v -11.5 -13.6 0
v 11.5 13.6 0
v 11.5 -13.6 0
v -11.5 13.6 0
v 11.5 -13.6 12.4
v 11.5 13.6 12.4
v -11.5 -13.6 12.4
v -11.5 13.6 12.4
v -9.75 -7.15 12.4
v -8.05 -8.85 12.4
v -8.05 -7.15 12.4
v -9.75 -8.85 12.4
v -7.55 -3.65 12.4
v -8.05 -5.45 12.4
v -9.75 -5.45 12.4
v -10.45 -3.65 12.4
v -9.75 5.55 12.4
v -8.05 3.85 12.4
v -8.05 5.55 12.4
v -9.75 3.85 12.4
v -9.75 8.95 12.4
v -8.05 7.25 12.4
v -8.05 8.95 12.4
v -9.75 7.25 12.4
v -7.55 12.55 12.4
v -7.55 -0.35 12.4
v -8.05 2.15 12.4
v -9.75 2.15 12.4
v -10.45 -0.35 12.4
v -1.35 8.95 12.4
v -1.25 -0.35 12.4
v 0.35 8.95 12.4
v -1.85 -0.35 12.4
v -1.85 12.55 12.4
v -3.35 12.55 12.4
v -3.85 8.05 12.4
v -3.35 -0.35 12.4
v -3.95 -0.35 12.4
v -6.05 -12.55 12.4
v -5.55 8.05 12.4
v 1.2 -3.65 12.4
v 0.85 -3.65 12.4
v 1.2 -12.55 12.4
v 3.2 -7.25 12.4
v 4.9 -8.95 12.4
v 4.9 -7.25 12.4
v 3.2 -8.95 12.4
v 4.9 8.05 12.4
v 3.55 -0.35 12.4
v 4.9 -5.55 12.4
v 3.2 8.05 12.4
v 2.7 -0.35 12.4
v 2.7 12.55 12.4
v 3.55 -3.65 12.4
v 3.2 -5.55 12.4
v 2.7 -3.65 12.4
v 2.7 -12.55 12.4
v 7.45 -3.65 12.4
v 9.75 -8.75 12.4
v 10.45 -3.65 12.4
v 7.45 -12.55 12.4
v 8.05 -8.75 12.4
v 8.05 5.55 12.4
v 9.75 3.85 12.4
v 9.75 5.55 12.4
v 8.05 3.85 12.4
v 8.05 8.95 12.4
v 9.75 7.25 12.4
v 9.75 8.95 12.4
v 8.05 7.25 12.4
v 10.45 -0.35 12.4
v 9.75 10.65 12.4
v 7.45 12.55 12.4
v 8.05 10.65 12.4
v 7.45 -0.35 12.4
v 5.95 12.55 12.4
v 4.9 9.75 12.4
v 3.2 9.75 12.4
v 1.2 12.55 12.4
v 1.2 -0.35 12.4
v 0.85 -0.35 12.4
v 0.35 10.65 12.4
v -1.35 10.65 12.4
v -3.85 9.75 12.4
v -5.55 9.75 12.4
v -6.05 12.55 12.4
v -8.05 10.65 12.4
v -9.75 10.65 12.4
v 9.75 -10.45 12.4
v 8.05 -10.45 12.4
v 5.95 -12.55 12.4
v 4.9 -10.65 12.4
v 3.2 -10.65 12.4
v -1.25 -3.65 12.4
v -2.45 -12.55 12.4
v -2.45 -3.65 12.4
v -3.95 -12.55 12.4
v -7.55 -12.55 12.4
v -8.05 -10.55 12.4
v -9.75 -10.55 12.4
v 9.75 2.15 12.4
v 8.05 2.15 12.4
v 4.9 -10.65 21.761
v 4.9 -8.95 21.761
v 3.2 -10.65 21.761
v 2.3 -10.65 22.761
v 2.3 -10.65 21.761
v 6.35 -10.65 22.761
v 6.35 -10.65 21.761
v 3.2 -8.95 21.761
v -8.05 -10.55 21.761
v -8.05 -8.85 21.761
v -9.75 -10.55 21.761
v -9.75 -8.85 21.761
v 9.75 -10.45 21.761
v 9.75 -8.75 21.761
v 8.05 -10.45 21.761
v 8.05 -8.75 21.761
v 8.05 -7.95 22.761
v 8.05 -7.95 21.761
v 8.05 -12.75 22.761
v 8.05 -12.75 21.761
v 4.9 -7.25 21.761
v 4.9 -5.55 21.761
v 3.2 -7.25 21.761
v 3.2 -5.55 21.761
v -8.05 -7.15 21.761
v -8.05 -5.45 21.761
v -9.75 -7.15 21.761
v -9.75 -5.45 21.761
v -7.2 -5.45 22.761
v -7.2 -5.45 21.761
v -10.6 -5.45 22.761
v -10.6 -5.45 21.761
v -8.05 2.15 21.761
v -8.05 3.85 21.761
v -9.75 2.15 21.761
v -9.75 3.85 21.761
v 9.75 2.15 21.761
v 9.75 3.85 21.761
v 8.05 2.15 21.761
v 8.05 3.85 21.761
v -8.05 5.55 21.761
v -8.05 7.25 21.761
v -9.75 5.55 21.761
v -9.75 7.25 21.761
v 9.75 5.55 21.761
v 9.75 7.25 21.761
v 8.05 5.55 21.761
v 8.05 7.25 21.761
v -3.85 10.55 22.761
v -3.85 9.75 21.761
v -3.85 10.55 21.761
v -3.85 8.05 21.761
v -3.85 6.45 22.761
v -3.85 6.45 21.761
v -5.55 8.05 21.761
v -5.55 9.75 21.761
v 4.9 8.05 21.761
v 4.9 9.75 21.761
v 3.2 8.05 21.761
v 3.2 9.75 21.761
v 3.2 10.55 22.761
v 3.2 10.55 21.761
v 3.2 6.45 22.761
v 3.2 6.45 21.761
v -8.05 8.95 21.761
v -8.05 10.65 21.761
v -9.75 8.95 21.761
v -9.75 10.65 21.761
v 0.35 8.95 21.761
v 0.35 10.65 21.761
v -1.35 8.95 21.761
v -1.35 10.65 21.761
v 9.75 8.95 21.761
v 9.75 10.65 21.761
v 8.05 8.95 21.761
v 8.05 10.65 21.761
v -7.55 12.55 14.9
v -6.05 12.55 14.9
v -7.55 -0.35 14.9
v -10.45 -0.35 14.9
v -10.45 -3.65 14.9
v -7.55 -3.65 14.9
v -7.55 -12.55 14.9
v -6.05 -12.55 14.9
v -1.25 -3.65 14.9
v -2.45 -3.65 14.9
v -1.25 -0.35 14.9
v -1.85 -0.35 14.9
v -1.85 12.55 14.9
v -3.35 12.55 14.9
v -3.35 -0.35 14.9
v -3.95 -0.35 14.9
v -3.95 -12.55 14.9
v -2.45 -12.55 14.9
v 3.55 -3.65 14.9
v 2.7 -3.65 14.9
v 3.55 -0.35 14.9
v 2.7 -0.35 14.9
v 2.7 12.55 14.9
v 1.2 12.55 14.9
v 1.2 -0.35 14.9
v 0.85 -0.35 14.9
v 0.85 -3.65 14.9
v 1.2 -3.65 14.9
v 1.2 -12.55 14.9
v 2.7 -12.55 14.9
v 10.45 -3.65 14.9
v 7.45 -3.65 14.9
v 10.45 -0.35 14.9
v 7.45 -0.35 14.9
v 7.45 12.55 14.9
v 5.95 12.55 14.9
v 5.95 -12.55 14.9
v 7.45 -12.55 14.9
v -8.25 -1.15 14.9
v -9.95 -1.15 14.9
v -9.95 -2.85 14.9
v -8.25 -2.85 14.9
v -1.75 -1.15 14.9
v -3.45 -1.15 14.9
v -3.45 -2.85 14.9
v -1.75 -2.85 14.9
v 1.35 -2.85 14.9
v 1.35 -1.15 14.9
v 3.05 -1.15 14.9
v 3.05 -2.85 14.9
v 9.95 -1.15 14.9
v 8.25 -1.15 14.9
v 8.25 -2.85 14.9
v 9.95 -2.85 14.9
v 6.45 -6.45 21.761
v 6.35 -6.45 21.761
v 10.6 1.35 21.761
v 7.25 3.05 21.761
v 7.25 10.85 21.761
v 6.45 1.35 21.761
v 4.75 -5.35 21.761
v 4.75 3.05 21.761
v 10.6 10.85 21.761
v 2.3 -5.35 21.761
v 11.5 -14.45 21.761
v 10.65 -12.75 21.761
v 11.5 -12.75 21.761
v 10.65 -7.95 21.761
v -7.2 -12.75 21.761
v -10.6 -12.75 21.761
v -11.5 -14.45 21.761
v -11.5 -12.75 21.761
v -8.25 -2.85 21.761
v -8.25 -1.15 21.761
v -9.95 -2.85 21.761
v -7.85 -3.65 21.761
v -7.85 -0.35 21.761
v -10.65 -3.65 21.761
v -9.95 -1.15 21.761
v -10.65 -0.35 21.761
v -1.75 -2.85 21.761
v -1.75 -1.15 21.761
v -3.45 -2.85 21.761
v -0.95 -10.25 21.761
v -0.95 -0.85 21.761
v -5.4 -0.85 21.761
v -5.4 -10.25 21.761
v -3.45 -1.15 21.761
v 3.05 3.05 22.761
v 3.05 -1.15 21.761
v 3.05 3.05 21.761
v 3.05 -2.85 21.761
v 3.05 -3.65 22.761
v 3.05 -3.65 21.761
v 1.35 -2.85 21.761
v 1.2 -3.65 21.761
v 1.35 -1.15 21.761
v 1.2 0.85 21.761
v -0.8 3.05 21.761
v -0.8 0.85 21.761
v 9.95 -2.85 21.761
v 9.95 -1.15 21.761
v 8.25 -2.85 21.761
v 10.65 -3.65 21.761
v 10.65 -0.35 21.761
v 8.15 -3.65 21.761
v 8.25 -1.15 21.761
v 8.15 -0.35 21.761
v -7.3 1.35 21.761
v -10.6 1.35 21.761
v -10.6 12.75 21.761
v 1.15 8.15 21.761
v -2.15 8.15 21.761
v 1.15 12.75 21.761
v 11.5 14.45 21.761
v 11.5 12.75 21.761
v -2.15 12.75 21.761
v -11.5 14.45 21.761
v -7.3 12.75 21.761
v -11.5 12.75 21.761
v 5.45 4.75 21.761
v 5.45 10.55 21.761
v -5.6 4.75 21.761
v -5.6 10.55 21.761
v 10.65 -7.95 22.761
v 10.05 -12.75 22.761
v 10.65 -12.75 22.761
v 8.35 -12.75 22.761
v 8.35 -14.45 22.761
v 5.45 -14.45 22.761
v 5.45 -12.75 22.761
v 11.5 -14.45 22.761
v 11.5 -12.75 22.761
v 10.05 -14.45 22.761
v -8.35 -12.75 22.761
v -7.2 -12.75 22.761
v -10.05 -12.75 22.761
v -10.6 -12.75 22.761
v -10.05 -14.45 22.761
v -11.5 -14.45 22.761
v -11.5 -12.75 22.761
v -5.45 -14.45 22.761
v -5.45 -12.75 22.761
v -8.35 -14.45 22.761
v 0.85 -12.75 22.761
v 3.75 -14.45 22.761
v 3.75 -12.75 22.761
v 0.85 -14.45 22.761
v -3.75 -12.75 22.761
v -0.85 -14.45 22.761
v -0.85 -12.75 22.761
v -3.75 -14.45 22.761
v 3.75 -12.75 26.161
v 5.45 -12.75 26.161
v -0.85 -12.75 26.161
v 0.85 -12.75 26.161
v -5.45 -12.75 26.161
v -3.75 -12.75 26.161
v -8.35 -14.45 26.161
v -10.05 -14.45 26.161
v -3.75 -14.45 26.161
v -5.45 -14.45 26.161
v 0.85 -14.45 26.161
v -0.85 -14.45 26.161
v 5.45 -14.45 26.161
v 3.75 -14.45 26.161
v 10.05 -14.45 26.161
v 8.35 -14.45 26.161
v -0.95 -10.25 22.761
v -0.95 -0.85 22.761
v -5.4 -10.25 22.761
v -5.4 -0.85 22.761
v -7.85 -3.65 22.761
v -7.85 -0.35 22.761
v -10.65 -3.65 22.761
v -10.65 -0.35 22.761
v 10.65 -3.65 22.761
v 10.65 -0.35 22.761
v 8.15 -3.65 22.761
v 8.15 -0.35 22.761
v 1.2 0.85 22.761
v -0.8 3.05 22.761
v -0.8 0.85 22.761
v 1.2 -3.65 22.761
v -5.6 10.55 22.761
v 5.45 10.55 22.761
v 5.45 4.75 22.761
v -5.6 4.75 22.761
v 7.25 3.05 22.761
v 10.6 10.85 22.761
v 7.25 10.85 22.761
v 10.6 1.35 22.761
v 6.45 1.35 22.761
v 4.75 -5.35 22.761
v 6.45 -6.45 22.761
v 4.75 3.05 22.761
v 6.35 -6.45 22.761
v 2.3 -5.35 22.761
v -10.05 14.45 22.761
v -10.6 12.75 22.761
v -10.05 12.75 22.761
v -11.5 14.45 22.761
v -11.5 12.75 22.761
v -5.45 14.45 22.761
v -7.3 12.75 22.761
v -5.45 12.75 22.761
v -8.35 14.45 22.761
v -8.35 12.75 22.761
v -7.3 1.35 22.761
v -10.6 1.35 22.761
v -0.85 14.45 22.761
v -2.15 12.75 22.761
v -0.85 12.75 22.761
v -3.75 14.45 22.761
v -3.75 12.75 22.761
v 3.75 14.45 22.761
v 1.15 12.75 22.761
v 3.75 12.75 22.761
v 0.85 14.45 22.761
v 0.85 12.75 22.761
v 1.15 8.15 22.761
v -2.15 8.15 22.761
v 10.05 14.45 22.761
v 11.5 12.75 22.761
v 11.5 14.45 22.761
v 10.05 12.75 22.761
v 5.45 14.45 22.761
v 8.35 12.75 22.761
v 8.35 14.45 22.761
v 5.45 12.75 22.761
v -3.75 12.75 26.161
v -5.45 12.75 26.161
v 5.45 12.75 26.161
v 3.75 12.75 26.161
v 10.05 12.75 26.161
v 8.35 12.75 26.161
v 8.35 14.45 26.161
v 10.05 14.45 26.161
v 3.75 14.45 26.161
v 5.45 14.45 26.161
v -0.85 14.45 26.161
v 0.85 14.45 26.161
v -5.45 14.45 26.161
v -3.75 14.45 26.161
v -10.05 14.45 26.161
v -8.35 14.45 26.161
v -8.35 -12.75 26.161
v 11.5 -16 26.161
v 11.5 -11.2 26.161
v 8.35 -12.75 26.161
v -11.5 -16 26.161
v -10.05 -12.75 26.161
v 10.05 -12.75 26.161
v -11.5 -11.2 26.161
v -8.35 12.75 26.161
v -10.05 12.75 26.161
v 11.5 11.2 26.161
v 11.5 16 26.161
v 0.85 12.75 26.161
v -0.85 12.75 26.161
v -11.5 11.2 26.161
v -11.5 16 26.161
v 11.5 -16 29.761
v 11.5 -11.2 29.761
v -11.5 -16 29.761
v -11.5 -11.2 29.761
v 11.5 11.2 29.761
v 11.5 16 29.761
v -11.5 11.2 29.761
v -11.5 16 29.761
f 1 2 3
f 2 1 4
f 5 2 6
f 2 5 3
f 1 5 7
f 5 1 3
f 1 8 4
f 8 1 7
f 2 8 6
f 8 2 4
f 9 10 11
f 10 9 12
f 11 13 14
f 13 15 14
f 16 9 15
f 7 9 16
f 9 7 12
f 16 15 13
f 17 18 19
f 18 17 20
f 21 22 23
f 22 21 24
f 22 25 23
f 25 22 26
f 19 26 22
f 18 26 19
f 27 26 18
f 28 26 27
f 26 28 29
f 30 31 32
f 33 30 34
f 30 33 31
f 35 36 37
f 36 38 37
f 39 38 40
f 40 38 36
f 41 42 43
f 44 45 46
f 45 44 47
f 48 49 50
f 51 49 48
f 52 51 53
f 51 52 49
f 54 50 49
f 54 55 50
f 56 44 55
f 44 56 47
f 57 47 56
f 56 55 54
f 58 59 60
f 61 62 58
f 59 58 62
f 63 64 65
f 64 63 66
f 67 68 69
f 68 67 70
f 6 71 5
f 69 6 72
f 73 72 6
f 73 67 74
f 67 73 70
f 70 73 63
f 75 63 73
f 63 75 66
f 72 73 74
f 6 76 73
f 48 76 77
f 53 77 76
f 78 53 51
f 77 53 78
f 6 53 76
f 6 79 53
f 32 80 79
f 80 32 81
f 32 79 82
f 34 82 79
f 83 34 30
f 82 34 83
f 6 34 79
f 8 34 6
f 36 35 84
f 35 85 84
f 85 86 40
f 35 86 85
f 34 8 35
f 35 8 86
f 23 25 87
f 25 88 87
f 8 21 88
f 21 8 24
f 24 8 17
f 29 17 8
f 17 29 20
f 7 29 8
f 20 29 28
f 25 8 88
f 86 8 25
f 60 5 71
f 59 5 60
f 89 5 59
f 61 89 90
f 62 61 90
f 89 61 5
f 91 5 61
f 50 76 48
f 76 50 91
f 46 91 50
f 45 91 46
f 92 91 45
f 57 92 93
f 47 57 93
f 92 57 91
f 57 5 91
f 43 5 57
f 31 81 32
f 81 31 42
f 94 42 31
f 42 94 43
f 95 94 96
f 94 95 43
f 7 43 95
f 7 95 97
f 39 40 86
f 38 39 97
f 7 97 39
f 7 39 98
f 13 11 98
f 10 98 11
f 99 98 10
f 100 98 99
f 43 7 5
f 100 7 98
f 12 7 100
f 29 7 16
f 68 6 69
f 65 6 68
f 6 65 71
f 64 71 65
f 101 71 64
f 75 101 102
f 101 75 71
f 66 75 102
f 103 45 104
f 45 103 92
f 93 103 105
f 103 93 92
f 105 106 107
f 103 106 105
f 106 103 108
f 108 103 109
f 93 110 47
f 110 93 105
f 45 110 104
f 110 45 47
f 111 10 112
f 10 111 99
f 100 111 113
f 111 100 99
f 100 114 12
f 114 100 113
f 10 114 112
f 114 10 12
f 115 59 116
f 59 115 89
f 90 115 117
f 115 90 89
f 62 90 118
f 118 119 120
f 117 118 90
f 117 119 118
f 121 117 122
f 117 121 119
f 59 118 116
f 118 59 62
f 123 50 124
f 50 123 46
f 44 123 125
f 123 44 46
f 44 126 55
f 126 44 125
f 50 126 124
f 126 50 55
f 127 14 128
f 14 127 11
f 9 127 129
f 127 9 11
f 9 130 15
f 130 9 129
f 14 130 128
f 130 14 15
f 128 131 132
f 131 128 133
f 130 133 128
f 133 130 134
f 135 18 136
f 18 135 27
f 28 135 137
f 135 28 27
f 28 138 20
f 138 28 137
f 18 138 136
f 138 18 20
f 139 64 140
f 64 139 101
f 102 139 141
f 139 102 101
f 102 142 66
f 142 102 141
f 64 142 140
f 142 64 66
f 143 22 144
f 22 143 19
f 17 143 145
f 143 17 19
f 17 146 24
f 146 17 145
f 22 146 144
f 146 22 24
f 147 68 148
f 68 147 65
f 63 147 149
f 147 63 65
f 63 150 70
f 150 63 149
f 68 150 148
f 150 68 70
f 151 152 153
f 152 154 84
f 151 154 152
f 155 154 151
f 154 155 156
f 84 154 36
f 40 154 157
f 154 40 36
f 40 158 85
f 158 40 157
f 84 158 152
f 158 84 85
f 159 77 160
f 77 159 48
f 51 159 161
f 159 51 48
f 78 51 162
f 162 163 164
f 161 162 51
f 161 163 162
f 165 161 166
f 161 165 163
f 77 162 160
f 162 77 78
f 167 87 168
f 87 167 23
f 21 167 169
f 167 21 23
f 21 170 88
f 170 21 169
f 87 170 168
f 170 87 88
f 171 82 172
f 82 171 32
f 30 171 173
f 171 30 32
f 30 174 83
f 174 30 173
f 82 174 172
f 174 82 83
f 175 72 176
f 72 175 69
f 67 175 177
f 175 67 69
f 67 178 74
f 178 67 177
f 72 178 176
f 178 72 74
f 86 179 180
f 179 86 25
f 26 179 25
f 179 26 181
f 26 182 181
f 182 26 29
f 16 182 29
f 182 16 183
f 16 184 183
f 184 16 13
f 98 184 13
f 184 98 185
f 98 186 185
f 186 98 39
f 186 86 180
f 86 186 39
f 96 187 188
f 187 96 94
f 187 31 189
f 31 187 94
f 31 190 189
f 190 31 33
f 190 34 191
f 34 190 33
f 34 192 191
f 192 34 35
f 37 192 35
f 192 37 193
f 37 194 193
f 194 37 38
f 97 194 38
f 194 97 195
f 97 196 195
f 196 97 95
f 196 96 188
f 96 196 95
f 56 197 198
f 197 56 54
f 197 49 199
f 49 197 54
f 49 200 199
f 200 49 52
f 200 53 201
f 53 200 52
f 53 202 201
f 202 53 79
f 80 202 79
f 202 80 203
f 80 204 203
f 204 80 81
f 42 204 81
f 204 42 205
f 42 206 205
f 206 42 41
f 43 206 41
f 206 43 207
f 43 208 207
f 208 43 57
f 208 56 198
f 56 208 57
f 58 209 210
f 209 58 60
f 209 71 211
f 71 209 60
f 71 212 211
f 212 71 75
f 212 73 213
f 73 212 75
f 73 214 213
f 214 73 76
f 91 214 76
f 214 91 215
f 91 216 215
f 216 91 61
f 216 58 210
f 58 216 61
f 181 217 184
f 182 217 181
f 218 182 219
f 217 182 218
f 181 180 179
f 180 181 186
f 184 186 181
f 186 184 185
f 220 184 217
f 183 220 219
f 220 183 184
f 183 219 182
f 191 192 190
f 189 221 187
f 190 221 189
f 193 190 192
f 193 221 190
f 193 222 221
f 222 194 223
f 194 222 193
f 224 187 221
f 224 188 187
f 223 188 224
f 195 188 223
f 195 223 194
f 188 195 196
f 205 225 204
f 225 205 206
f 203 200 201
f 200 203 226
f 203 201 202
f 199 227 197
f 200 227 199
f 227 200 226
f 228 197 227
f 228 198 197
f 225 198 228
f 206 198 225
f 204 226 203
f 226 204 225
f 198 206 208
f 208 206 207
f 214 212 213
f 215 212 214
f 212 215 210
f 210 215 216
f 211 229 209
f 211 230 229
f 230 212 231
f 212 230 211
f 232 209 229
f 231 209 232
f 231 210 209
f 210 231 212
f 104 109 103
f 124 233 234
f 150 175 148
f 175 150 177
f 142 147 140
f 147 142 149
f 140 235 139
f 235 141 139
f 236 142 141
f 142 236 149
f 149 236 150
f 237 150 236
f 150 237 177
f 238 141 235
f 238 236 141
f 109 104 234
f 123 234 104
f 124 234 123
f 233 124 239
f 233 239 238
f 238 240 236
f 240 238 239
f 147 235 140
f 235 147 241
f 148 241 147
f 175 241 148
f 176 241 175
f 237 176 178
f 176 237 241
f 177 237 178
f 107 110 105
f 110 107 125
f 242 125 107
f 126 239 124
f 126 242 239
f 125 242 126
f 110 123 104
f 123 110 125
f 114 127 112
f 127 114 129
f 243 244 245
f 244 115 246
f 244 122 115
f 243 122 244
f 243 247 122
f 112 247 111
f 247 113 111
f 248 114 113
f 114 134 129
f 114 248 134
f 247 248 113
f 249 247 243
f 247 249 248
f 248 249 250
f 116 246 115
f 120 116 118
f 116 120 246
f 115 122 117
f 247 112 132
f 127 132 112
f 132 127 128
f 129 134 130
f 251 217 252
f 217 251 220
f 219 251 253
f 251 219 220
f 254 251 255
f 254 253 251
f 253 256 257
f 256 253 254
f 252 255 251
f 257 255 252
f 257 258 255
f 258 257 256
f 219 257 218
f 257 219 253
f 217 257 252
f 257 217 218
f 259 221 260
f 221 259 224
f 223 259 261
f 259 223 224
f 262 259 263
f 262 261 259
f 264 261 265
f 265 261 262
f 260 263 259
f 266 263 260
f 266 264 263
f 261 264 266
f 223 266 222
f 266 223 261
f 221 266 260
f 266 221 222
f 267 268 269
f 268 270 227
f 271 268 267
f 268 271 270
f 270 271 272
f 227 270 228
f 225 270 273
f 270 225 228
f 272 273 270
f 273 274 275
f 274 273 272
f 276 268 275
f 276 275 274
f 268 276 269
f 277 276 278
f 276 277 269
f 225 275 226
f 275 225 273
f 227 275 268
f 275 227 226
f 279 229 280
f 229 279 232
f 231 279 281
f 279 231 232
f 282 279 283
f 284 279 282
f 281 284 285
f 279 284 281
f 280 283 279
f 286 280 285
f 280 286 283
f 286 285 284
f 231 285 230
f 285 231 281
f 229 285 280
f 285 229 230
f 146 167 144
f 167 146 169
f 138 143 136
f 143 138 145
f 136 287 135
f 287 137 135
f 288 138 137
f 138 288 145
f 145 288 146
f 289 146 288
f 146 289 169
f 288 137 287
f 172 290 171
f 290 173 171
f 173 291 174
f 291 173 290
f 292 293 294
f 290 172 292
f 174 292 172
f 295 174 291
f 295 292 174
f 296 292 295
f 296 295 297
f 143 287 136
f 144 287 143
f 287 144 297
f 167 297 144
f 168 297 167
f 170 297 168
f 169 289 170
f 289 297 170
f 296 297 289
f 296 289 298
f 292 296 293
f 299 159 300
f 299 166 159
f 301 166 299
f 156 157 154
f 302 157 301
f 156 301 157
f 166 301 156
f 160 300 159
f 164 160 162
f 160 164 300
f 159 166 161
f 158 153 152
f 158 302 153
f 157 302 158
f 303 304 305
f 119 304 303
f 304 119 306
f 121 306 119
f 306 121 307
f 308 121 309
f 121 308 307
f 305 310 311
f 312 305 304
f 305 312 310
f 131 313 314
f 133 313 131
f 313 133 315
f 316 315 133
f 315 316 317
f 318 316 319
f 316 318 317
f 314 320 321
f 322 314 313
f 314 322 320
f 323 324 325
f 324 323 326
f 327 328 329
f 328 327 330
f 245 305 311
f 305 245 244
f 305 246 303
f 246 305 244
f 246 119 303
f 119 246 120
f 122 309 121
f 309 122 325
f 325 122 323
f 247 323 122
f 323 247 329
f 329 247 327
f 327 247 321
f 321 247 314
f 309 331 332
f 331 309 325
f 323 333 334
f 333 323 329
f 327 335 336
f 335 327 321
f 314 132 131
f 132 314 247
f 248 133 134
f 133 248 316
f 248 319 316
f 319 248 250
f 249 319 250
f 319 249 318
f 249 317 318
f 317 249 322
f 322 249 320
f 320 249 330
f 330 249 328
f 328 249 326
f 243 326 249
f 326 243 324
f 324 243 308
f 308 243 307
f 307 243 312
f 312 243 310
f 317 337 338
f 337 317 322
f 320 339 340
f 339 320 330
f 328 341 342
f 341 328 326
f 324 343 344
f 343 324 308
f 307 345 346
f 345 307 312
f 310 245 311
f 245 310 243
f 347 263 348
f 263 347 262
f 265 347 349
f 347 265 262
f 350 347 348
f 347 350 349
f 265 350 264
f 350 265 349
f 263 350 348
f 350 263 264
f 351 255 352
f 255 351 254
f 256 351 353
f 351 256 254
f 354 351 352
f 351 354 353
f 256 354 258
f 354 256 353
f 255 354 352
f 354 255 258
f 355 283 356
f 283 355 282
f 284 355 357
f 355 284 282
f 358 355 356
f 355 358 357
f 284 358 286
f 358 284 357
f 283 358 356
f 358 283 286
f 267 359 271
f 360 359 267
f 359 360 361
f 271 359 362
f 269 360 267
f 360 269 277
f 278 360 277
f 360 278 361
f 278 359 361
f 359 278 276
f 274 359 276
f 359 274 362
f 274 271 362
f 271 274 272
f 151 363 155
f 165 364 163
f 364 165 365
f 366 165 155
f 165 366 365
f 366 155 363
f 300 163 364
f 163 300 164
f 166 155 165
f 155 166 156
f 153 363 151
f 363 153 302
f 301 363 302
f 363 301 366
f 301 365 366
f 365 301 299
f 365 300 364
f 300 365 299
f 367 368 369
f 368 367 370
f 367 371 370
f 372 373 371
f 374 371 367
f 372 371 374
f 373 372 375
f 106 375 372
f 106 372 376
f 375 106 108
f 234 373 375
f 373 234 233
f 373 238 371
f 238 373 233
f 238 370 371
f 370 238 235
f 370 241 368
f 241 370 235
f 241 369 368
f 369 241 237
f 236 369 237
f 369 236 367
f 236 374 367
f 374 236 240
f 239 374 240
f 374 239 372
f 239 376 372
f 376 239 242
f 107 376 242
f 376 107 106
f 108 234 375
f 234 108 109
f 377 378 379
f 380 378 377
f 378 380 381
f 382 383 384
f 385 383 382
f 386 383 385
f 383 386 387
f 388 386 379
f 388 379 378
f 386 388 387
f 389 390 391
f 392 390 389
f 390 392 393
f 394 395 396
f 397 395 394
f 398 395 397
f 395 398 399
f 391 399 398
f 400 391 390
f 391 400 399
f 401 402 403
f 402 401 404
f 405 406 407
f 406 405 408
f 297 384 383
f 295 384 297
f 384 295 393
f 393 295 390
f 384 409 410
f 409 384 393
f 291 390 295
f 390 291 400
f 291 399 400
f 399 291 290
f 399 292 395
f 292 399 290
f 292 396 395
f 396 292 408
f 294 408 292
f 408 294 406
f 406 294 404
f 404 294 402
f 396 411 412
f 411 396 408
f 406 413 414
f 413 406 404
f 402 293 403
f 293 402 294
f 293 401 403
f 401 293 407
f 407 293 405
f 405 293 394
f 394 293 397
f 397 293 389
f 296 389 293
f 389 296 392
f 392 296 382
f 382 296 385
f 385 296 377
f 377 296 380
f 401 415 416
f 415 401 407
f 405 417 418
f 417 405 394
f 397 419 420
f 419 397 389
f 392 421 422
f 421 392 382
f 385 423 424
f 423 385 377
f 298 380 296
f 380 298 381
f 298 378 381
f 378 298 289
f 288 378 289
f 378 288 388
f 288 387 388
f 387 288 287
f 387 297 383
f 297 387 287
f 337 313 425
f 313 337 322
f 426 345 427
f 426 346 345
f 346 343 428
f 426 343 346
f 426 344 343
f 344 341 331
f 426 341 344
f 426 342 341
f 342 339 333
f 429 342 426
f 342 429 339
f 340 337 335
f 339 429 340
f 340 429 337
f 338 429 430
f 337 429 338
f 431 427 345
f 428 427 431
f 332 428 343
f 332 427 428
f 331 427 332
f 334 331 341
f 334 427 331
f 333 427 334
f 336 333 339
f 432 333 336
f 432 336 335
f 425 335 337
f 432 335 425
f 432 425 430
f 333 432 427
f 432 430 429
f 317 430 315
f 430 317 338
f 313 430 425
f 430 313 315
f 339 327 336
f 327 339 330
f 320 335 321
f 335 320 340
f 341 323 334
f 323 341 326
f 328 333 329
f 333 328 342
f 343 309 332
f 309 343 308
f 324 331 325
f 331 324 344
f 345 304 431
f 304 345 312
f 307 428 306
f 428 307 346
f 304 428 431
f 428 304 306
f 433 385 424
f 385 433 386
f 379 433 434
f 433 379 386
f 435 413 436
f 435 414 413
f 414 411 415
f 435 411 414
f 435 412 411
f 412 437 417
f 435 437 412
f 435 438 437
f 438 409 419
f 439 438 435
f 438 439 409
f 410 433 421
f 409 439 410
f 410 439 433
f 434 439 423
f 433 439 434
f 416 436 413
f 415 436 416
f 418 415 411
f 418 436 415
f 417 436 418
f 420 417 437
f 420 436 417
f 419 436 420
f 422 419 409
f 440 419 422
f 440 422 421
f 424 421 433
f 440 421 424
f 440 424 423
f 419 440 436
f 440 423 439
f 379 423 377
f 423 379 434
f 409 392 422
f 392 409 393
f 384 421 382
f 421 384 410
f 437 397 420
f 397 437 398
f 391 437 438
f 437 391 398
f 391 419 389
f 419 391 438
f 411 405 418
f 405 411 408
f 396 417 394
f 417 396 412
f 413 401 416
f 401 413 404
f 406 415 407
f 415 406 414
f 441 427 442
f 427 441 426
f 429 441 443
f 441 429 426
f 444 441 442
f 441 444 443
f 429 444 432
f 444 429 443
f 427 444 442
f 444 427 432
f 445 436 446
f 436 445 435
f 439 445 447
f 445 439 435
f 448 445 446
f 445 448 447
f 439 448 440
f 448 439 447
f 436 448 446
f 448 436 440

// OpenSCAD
// Generated by SolidPython 0.4.2 on 2020-09-29 23:19:56
//!OpenSCAD

scale(v = 0.0100000000) {
	translate(v = [-1150, -1360, 0]) {
		union() {
			color(c = [0.4000000000, 0.4000000000, 0.4000000000]) {
				translate(v = [0, 0, 0]) {
					linear_extrude(height = 1000.0000000000) {
						polygon(paths = [[0, 1, 2, 3]], points = [[0, 0], [0, 2720], [2300, 2720], [2300, 0]]);
					}
				}
			}
			color(c = [0.2000000000, 0.6000000000, 0.2000000000]) {
				translate(v = [0, 0, 1000.0000000000]) {
					linear_extrude(height = 120.0000000000) {
						polygon(paths = [[0, 1, 2, 3]], points = [[0, 1305], [0, 2720], [2300, 2720], [2300, 1305]]);
					}
				}
			}
			color(c = [0.4000000000, 0.4000000000, 0.4000000000]) {
				translate(v = [0, 0, 1000.0000000000]) {
					linear_extrude(height = 120.0000000000) {
						polygon(paths = [[0, 1, 2, 3]], points = [[0, 0], [0, 1305], [2300, 1305], [2300, 0]]);
					}
				}
			}
			color(c = [0.9000000000, 0.6000000000, 0.6000000000]) {
				translate(v = [0, 0, 1120.0000000000]) {
					linear_extrude(height = 120.0000000000) {
						polygon(paths = [[0, 1, 2, 3]], points = [[135, 1485], [135, 2485], [395, 2485], [395, 1485]]);
					}
				}
			}
			color(c = [0.9000000000, 0.6000000000, 0.6000000000]) {
				translate(v = [0, 0, 1120.0000000000]) {
					linear_extrude(height = 120.0000000000) {
						polygon(paths = [[0, 1, 2, 3]], points = [[545, 1485], [545, 2485], [815, 2485], [815, 1485]]);
					}
				}
			}
			color(c = [0.9000000000, 0.6000000000, 0.6000000000]) {
				translate(v = [0, 0, 1120.0000000000]) {
					linear_extrude(height = 120.0000000000) {
						polygon(paths = [[0, 1, 2, 3]], points = [[965, 1485], [965, 2485], [1270, 2485], [1270, 1485]]);
					}
				}
			}
			color(c = [0.9000000000, 0.6000000000, 0.6000000000]) {
				translate(v = [0, 0, 1120.0000000000]) {
					linear_extrude(height = 120.0000000000) {
						polygon(paths = [[0, 1, 2, 3]], points = [[1420, 1485], [1420, 2485], [1745, 2485], [1745, 1485]]);
					}
				}
			}
			color(c = [0.9000000000, 0.6000000000, 0.6000000000]) {
				translate(v = [0, 0, 1120.0000000000]) {
					linear_extrude(height = 120.0000000000) {
						polygon(paths = [[0, 1, 2, 3]], points = [[1895, 1485], [1895, 2485], [2165, 2485], [2165, 1485]]);
					}
				}
			}
			color(c = [0.9000000000, 0.6000000000, 0.9000000000]) {
				translate(v = [0, 0, 1120.0000000000]) {
					linear_extrude(height = 120.0000000000) {
						polygon(paths = [[0, 1, 2, 3]], points = [[135, 235], [135, 885], [395, 885], [395, 235]]);
					}
				}
			}
			color(c = [0.9000000000, 0.6000000000, 0.9000000000]) {
				translate(v = [0, 0, 1120.0000000000]) {
					linear_extrude(height = 120.0000000000) {
						polygon(paths = [[0, 1, 2, 3]], points = [[545, 235], [545, 885], [755, 885], [755, 235]]);
					}
				}
			}
			color(c = [0.9000000000, 0.6000000000, 0.9000000000]) {
				translate(v = [0, 0, 1120.0000000000]) {
					linear_extrude(height = 120.0000000000) {
						polygon(paths = [[0, 1, 2, 3]], points = [[905, 235], [905, 885], [1270, 885], [1270, 235]]);
					}
				}
			}
			color(c = [0.9000000000, 0.6000000000, 0.9000000000]) {
				translate(v = [0, 0, 1120.0000000000]) {
					linear_extrude(height = 120.0000000000) {
						polygon(paths = [[0, 1, 2, 3]], points = [[1420, 235], [1420, 885], [1745, 885], [1745, 235]]);
					}
				}
			}
			color(c = [0.9000000000, 0.6000000000, 0.9000000000]) {
				translate(v = [0, 0, 1120.0000000000]) {
					linear_extrude(height = 120.0000000000) {
						polygon(paths = [[0, 1, 2, 3]], points = [[1895, 235], [1895, 885], [2165, 885], [2165, 235]]);
					}
				}
			}
			color(c = [0.2000000000, 0.6000000000, 0.2000000000]) {
				translate(v = [0, 0, 1120.0000000000]) {
					linear_extrude(height = 120.0000000000) {
						difference() {
							polygon(paths = [[0, 1, 2, 3]], points = [[0, 1305], [0, 2720], [2300, 2720], [2300, 1305]]);
							polygon(paths = [[0, 1, 2, 3]], points = [[135, 1485], [395, 1485], [395, 2485], [135, 2485]]);
							polygon(paths = [[0, 1, 2, 3]], points = [[545, 1485], [815, 1485], [815, 2485], [545, 2485]]);
							polygon(paths = [[0, 1, 2, 3]], points = [[965, 1485], [1270, 1485], [1270, 2485], [965, 2485]]);
							polygon(paths = [[0, 1, 2, 3]], points = [[1420, 1485], [1745, 1485], [1745, 2485], [1420, 2485]]);
							polygon(paths = [[0, 1, 2, 3]], points = [[1895, 1485], [2165, 1485], [2165, 2485], [1895, 2485]]);
						}
					}
				}
			}
			color(c = [0.4000000000, 0.4000000000, 0.4000000000]) {
				translate(v = [0, 0, 1120.0000000000]) {
					linear_extrude(height = 120.0000000000) {
						difference() {
							polygon(paths = [[0, 1, 2, 3]], points = [[0, 0], [0, 1305], [2300, 1305], [2300, 0]]);
							polygon(paths = [[0, 1, 2, 3]], points = [[135, 235], [395, 235], [395, 885], [135, 885]]);
							polygon(paths = [[0, 1, 2, 3]], points = [[545, 235], [755, 235], [755, 885], [545, 885]]);
							polygon(paths = [[0, 1, 2, 3]], points = [[905, 235], [1270, 235], [1270, 885], [905, 885]]);
							polygon(paths = [[0, 1, 2, 3]], points = [[1420, 235], [1745, 235], [1745, 885], [1420, 885]]);
							polygon(paths = [[0, 1, 2, 3]], points = [[1895, 235], [2165, 235], [2165, 885], [1895, 885]]);
						}
					}
				}
			}
			color(c = [0.1000000000, 0.1000000000, 0.1000000000]) {
				translate(v = [0, 0, 1240.0000000000]) {
					linear_extrude(height = 70.0000000000) {
						polygon(paths = [[0, 1, 2, 3]], points = [[1470, 295], [1470, 465], [1640, 465], [1640, 295]]);
					}
				}
			}
			color(c = [0.1000000000, 0.1000000000, 0.1000000000]) {
				translate(v = [0, 0, 1240.0000000000]) {
					linear_extrude(height = 70.0000000000) {
						polygon(paths = [[0, 1, 2, 3]], points = [[175, 305], [175, 475], [345, 475], [345, 305]]);
					}
				}
			}
			color(c = [0.1000000000, 0.1000000000, 0.1000000000]) {
				translate(v = [0, 0, 1240.0000000000]) {
					linear_extrude(height = 70.0000000000) {
						polygon(paths = [[0, 1, 2, 3]], points = [[1955, 315], [1955, 485], [2125, 485], [2125, 315]]);
					}
				}
			}
			color(c = [0.1000000000, 0.1000000000, 0.1000000000]) {
				translate(v = [0, 0, 1240.0000000000]) {
					linear_extrude(height = 70.0000000000) {
						polygon(paths = [[0, 1, 2, 3]], points = [[1470, 635], [1470, 805], [1640, 805], [1640, 635]]);
					}
				}
			}
			color(c = [0.1000000000, 0.1000000000, 0.1000000000]) {
				translate(v = [0, 0, 1240.0000000000]) {
					linear_extrude(height = 70.0000000000) {
						polygon(paths = [[0, 1, 2, 3]], points = [[175, 645], [175, 815], [345, 815], [345, 645]]);
					}
				}
			}
			color(c = [0.1000000000, 0.1000000000, 0.1000000000]) {
				translate(v = [0, 0, 1240.0000000000]) {
					linear_extrude(height = 70.0000000000) {
						polygon(paths = [[0, 1, 2, 3]], points = [[175, 1575], [175, 1745], [345, 1745], [345, 1575]]);
					}
				}
			}
			color(c = [0.1000000000, 0.1000000000, 0.1000000000]) {
				translate(v = [0, 0, 1240.0000000000]) {
					linear_extrude(height = 70.0000000000) {
						polygon(paths = [[0, 1, 2, 3]], points = [[1955, 1575], [1955, 1745], [2125, 1745], [2125, 1575]]);
					}
				}
			}
			color(c = [0.1000000000, 0.1000000000, 0.1000000000]) {
				translate(v = [0, 0, 1240.0000000000]) {
					linear_extrude(height = 70.0000000000) {
						polygon(paths = [[0, 1, 2, 3]], points = [[175, 1915], [175, 2085], [345, 2085], [345, 1915]]);
					}
				}
			}
			color(c = [0.1000000000, 0.1000000000, 0.1000000000]) {
				translate(v = [0, 0, 1240.0000000000]) {
					linear_extrude(height = 70.0000000000) {
						polygon(paths = [[0, 1, 2, 3]], points = [[1955, 1915], [1955, 2085], [2125, 2085], [2125, 1915]]);
					}
				}
			}
			color(c = [0.1000000000, 0.1000000000, 0.1000000000]) {
				translate(v = [0, 0, 1240.0000000000]) {
					linear_extrude(height = 70.0000000000) {
						polygon(paths = [[0, 1, 2, 3]], points = [[595, 2165], [595, 2335], [765, 2335], [765, 2165]]);
					}
				}
			}
			color(c = [0.1000000000, 0.1000000000, 0.1000000000]) {
				translate(v = [0, 0, 1240.0000000000]) {
					linear_extrude(height = 70.0000000000) {
						polygon(paths = [[0, 1, 2, 3]], points = [[1470, 2165], [1470, 2335], [1640, 2335], [1640, 2165]]);
					}
				}
			}
			color(c = [0.1000000000, 0.1000000000, 0.1000000000]) {
				translate(v = [0, 0, 1240.0000000000]) {
					linear_extrude(height = 70.0000000000) {
						polygon(paths = [[0, 1, 2, 3]], points = [[175, 2255], [175, 2425], [345, 2425], [345, 2255]]);
					}
				}
			}
			color(c = [0.1000000000, 0.1000000000, 0.1000000000]) {
				translate(v = [0, 0, 1240.0000000000]) {
					linear_extrude(height = 70.0000000000) {
						polygon(paths = [[0, 1, 2, 3]], points = [[1015, 2255], [1015, 2425], [1185, 2425], [1185, 2255]]);
					}
				}
			}
			color(c = [0.1000000000, 0.1000000000, 0.1000000000]) {
				translate(v = [0, 0, 1240.0000000000]) {
					linear_extrude(height = 70.0000000000) {
						polygon(paths = [[0, 1, 2, 3]], points = [[1955, 2255], [1955, 2425], [2125, 2425], [2125, 2255]]);
					}
				}
			}
			color(c = [1.0000000000, 1.0000000000, 1.0000000000]) {
				translate(v = [0, 0, 1240.0000000000]) {
					linear_extrude(height = 70.0000000000) {
						polygon(paths = [[0, 1, 2, 3, 4, 5, 6, 7]], points = [[395, 105], [395, 995], [105, 995], [105, 1325], [395, 1325], [395, 2615], [545, 2615], [545, 105]]);
					}
				}
			}
			color(c = [1.0000000000, 1.0000000000, 1.0000000000]) {
				translate(v = [0, 0, 1240.0000000000]) {
					linear_extrude(height = 70.0000000000) {
						polygon(paths = [[0, 1, 2, 3, 4, 5, 6, 7, 8, 9]], points = [[755, 105], [755, 1325], [815, 1325], [815, 2615], [965, 2615], [965, 1325], [1025, 1325], [1025, 995], [905, 995], [905, 105]]);
					}
				}
			}
			color(c = [1.0000000000, 1.0000000000, 1.0000000000]) {
				translate(v = [0, 0, 1240.0000000000]) {
					linear_extrude(height = 70.0000000000) {
						polygon(paths = [[0, 1, 2, 3, 4, 5, 6, 7, 8, 9, 10, 11]], points = [[1270, 105], [1270, 995], [1235, 995], [1235, 1325], [1270, 1325], [1270, 2615], [1420, 2615], [1420, 1325], [1505, 1325], [1505, 995], [1420, 995], [1420, 105]]);
					}
				}
			}
			color(c = [1.0000000000, 1.0000000000, 1.0000000000]) {
				translate(v = [0, 0, 1240.0000000000]) {
					linear_extrude(height = 70.0000000000) {
						polygon(paths = [[0, 1, 2, 3, 4, 5, 6, 7]], points = [[1745, 105], [1745, 2615], [1895, 2615], [1895, 1325], [2195, 1325], [2195, 995], [1895, 995], [1895, 105]]);
					}
				}
			}
			color(c = [0.1000000000, 0.1000000000, 0.1000000000]) {
				translate(v = [0, 0, 1310.0000000000]) {
					linear_extrude(height = 180.0000000000) {
						polygon(paths = [[0, 1, 2, 3]], points = [[1470, 295], [1470, 465], [1640, 465], [1640, 295]]);
					}
				}
			}
			color(c = [0.1000000000, 0.1000000000, 0.1000000000]) {
				translate(v = [0, 0, 1310.0000000000]) {
					linear_extrude(height = 180.0000000000) {
						polygon(paths = [[0, 1, 2, 3]], points = [[175, 305], [175, 475], [345, 475], [345, 305]]);
					}
				}
			}
			color(c = [0.1000000000, 0.1000000000, 0.1000000000]) {
				translate(v = [0, 0, 1310.0000000000]) {
					linear_extrude(height = 180.0000000000) {
						polygon(paths = [[0, 1, 2, 3]], points = [[1955, 315], [1955, 485], [2125, 485], [2125, 315]]);
					}
				}
			}
			color(c = [0.1000000000, 0.1000000000, 0.1000000000]) {
				translate(v = [0, 0, 1310.0000000000]) {
					linear_extrude(height = 180.0000000000) {
						polygon(paths = [[0, 1, 2, 3]], points = [[1470, 635], [1470, 805], [1640, 805], [1640, 635]]);
					}
				}
			}
			color(c = [0.1000000000, 0.1000000000, 0.1000000000]) {
				translate(v = [0, 0, 1310.0000000000]) {
					linear_extrude(height = 180.0000000000) {
						polygon(paths = [[0, 1, 2, 3]], points = [[175, 645], [175, 815], [345, 815], [345, 645]]);
					}
				}
			}
			color(c = [0.1000000000, 0.1000000000, 0.1000000000]) {
				translate(v = [0, 0, 1310.0000000000]) {
					linear_extrude(height = 180.0000000000) {
						polygon(paths = [[0, 1, 2, 3]], points = [[175, 1575], [175, 1745], [345, 1745], [345, 1575]]);
					}
				}
			}
			color(c = [0.1000000000, 0.1000000000, 0.1000000000]) {
				translate(v = [0, 0, 1310.0000000000]) {
					linear_extrude(height = 180.0000000000) {
						polygon(paths = [[0, 1, 2, 3]], points = [[1955, 1575], [1955, 1745], [2125, 1745], [2125, 1575]]);
					}
				}
			}
			color(c = [0.1000000000, 0.1000000000, 0.1000000000]) {
				translate(v = [0, 0, 1310.0000000000]) {
					linear_extrude(height = 180.0000000000) {
						polygon(paths = [[0, 1, 2, 3]], points = [[175, 1915], [175, 2085], [345, 2085], [345, 1915]]);
					}
				}
			}
			color(c = [0.1000000000, 0.1000000000, 0.1000000000]) {
				translate(v = [0, 0, 1310.0000000000]) {
					linear_extrude(height = 180.0000000000) {
						polygon(paths = [[0, 1, 2, 3]], points = [[1955, 1915], [1955, 2085], [2125, 2085], [2125, 1915]]);
					}
				}
			}
			color(c = [0.1000000000, 0.1000000000, 0.1000000000]) {
				translate(v = [0, 0, 1310.0000000000]) {
					linear_extrude(height = 180.0000000000) {
						polygon(paths = [[0, 1, 2, 3]], points = [[595, 2165], [595, 2335], [765, 2335], [765, 2165]]);
					}
				}
			}
			color(c = [0.1000000000, 0.1000000000, 0.1000000000]) {
				translate(v = [0, 0, 1310.0000000000]) {
					linear_extrude(height = 180.0000000000) {
						polygon(paths = [[0, 1, 2, 3]], points = [[1470, 2165], [1470, 2335], [1640, 2335], [1640, 2165]]);
					}
				}
			}
			color(c = [0.1000000000, 0.1000000000, 0.1000000000]) {
				translate(v = [0, 0, 1310.0000000000]) {
					linear_extrude(height = 180.0000000000) {
						polygon(paths = [[0, 1, 2, 3]], points = [[175, 2255], [175, 2425], [345, 2425], [345, 2255]]);
					}
				}
			}
			color(c = [0.1000000000, 0.1000000000, 0.1000000000]) {
				translate(v = [0, 0, 1310.0000000000]) {
					linear_extrude(height = 180.0000000000) {
						polygon(paths = [[0, 1, 2, 3]], points = [[1015, 2255], [1015, 2425], [1185, 2425], [1185, 2255]]);
					}
				}
			}
			color(c = [0.1000000000, 0.1000000000, 0.1000000000]) {
				translate(v = [0, 0, 1310.0000000000]) {
					linear_extrude(height = 180.0000000000) {
						polygon(paths = [[0, 1, 2, 3]], points = [[1955, 2255], [1955, 2425], [2125, 2425], [2125, 2255]]);
					}
				}
			}
			color(c = [0.7000000000, 0, 0]) {
				translate(v = [0, 0, 1310.0000000000]) {
					linear_extrude(height = 180.0000000000) {
						polygon(paths = [[0, 1, 2, 3, 4, 5, 6, 7]], points = [[395, 105], [395, 995], [105, 995], [105, 1325], [395, 1325], [395, 2615], [545, 2615], [545, 105]]);
					}
				}
			}
			color(c = [0.7000000000, 0, 0]) {
				translate(v = [0, 0, 1310.0000000000]) {
					linear_extrude(height = 180.0000000000) {
						polygon(paths = [[0, 1, 2, 3, 4, 5, 6, 7, 8, 9]], points = [[755, 105], [755, 1325], [815, 1325], [815, 2615], [965, 2615], [965, 1325], [1025, 1325], [1025, 995], [905, 995], [905, 105]]);
					}
				}
			}
			color(c = [0.7000000000, 0, 0]) {
				translate(v = [0, 0, 1310.0000000000]) {
					linear_extrude(height = 180.0000000000) {
						polygon(paths = [[0, 1, 2, 3, 4, 5, 6, 7, 8, 9, 10, 11]], points = [[1270, 105], [1270, 995], [1235, 995], [1235, 1325], [1270, 1325], [1270, 2615], [1420, 2615], [1420, 1325], [1505, 1325], [1505, 995], [1420, 995], [1420, 105]]);
					}
				}
			}
			color(c = [0.7000000000, 0, 0]) {
				translate(v = [0, 0, 1310.0000000000]) {
					linear_extrude(height = 180.0000000000) {
						polygon(paths = [[0, 1, 2, 3, 4, 5, 6, 7]], points = [[1745, 105], [1745, 2615], [1895, 2615], [1895, 1325], [2195, 1325], [2195, 995], [1895, 995], [1895, 105]]);
					}
				}
			}
			color(c = [0.1000000000, 0.1000000000, 0.1000000000]) {
				translate(v = [0, 0, 1490.0000000000]) {
					linear_extrude(height = 686.1000000000) {
						polygon(paths = [[0, 1, 2, 3]], points = [[1470, 295], [1470, 465], [1640, 465], [1640, 295]]);
					}
				}
			}
			color(c = [0.1000000000, 0.1000000000, 0.1000000000]) {
				translate(v = [0, 0, 1490.0000000000]) {
					linear_extrude(height = 686.1000000000) {
						polygon(paths = [[0, 1, 2, 3]], points = [[175, 305], [175, 475], [345, 475], [345, 305]]);
					}
				}
			}
			color(c = [0.1000000000, 0.1000000000, 0.1000000000]) {
				translate(v = [0, 0, 1490.0000000000]) {
					linear_extrude(height = 686.1000000000) {
						polygon(paths = [[0, 1, 2, 3]], points = [[1955, 315], [1955, 485], [2125, 485], [2125, 315]]);
					}
				}
			}
			color(c = [0.1000000000, 0.1000000000, 0.1000000000]) {
				translate(v = [0, 0, 1490.0000000000]) {
					linear_extrude(height = 686.1000000000) {
						polygon(paths = [[0, 1, 2, 3]], points = [[1470, 635], [1470, 805], [1640, 805], [1640, 635]]);
					}
				}
			}
			color(c = [0.1000000000, 0.1000000000, 0.1000000000]) {
				translate(v = [0, 0, 1490.0000000000]) {
					linear_extrude(height = 686.1000000000) {
						polygon(paths = [[0, 1, 2, 3]], points = [[175, 645], [175, 815], [345, 815], [345, 645]]);
					}
				}
			}
			color(c = [0.1000000000, 0.1000000000, 0.1000000000]) {
				translate(v = [0, 0, 1490.0000000000]) {
					linear_extrude(height = 686.1000000000) {
						polygon(paths = [[0, 1, 2, 3]], points = [[155, 1075], [155, 1245], [325, 1245], [325, 1075]]);
					}
				}
			}
			color(c = [0.1000000000, 0.1000000000, 0.1000000000]) {
				translate(v = [0, 0, 1490.0000000000]) {
					linear_extrude(height = 686.1000000000) {
						polygon(paths = [[0, 1, 2, 3]], points = [[805, 1075], [805, 1245], [975, 1245], [975, 1075]]);
					}
				}
			}
			color(c = [0.1000000000, 0.1000000000, 0.1000000000]) {
				translate(v = [0, 0, 1490.0000000000]) {
					linear_extrude(height = 686.1000000000) {
						polygon(paths = [[0, 1, 2, 3]], points = [[1285, 1075], [1285, 1245], [1455, 1245], [1455, 1075]]);
					}
				}
			}
			color(c = [0.1000000000, 0.1000000000, 0.1000000000]) {
				translate(v = [0, 0, 1490.0000000000]) {
					linear_extrude(height = 686.1000000000) {
						polygon(paths = [[0, 1, 2, 3]], points = [[1975, 1075], [1975, 1245], [2145, 1245], [2145, 1075]]);
					}
				}
			}
			color(c = [0.1000000000, 0.1000000000, 0.1000000000]) {
				translate(v = [0, 0, 1490.0000000000]) {
					linear_extrude(height = 686.1000000000) {
						polygon(paths = [[0, 1, 2, 3]], points = [[175, 1575], [175, 1745], [345, 1745], [345, 1575]]);
					}
				}
			}
			color(c = [0.1000000000, 0.1000000000, 0.1000000000]) {
				translate(v = [0, 0, 1490.0000000000]) {
					linear_extrude(height = 686.1000000000) {
						polygon(paths = [[0, 1, 2, 3]], points = [[1955, 1575], [1955, 1745], [2125, 1745], [2125, 1575]]);
					}
				}
			}
			color(c = [0.1000000000, 0.1000000000, 0.1000000000]) {
				translate(v = [0, 0, 1490.0000000000]) {
					linear_extrude(height = 686.1000000000) {
						polygon(paths = [[0, 1, 2, 3]], points = [[175, 1915], [175, 2085], [345, 2085], [345, 1915]]);
					}
				}
			}
			color(c = [0.1000000000, 0.1000000000, 0.1000000000]) {
				translate(v = [0, 0, 1490.0000000000]) {
					linear_extrude(height = 686.1000000000) {
						polygon(paths = [[0, 1, 2, 3]], points = [[1955, 1915], [1955, 2085], [2125, 2085], [2125, 1915]]);
					}
				}
			}
			color(c = [0.1000000000, 0.1000000000, 0.1000000000]) {
				translate(v = [0, 0, 1490.0000000000]) {
					linear_extrude(height = 686.1000000000) {
						polygon(paths = [[0, 1, 2, 3]], points = [[595, 2165], [595, 2335], [765, 2335], [765, 2165]]);
					}
				}
			}
			color(c = [0.1000000000, 0.1000000000, 0.1000000000]) {
				translate(v = [0, 0, 1490.0000000000]) {
					linear_extrude(height = 686.1000000000) {
						polygon(paths = [[0, 1, 2, 3]], points = [[1470, 2165], [1470, 2335], [1640, 2335], [1640, 2165]]);
					}
				}
			}
			color(c = [0.1000000000, 0.1000000000, 0.1000000000]) {
				translate(v = [0, 0, 1490.0000000000]) {
					linear_extrude(height = 686.1000000000) {
						polygon(paths = [[0, 1, 2, 3]], points = [[175, 2255], [175, 2425], [345, 2425], [345, 2255]]);
					}
				}
			}
			color(c = [0.1000000000, 0.1000000000, 0.1000000000]) {
				translate(v = [0, 0, 1490.0000000000]) {
					linear_extrude(height = 686.1000000000) {
						polygon(paths = [[0, 1, 2, 3]], points = [[1015, 2255], [1015, 2425], [1185, 2425], [1185, 2255]]);
					}
				}
			}
			color(c = [0.1000000000, 0.1000000000, 0.1000000000]) {
				translate(v = [0, 0, 1490.0000000000]) {
					linear_extrude(height = 686.1000000000) {
						polygon(paths = [[0, 1, 2, 3]], points = [[1955, 2255], [1955, 2425], [2125, 2425], [2125, 2255]]);
					}
				}
			}
			color(c = [0.9000000000, 0.6000000000, 0.6000000000]) {
				translate(v = [0, 0, 2176.1000000000]) {
					linear_extrude(height = 100.0000000000) {
						polygon(paths = [[0, 1, 2, 3, 4, 5, 6, 7, 8, 9, 10, 11]], points = [[0, -85], [0, 85], [90, 85], [90, 815], [430, 815], [430, 85], [1955, 85], [1955, 565], [2215, 565], [2215, 85], [2300, 85], [2300, -85]]);
					}
				}
			}
			color(c = [0.9000000000, 0.6000000000, 0.6000000000]) {
				translate(v = [0, 0, 2176.1000000000]) {
					linear_extrude(height = 100.0000000000) {
						polygon(paths = [[0, 1, 2, 3]], points = [[610, 335], [610, 1275], [1055, 1275], [1055, 335]]);
					}
				}
			}
			color(c = [0.9000000000, 0.6000000000, 0.6000000000]) {
				translate(v = [0, 0, 2176.1000000000]) {
					linear_extrude(height = 100.0000000000) {
						polygon(paths = [[0, 1, 2, 3]], points = [[85, 995], [85, 1325], [365, 1325], [365, 995]]);
					}
				}
			}
			color(c = [0.9000000000, 0.6000000000, 0.6000000000]) {
				translate(v = [0, 0, 2176.1000000000]) {
					linear_extrude(height = 100.0000000000) {
						polygon(paths = [[0, 1, 2, 3]], points = [[1965, 995], [1965, 1325], [2215, 1325], [2215, 995]]);
					}
				}
			}
			color(c = [0.9000000000, 0.6000000000, 0.6000000000]) {
				translate(v = [0, 0, 2176.1000000000]) {
					linear_extrude(height = 100.0000000000) {
						polygon(paths = [[0, 1, 2, 3, 4, 5]], points = [[1270, 995], [1270, 1445], [1070, 1445], [1070, 1665], [1455, 1665], [1455, 995]]);
					}
				}
			}
			color(c = [0.9000000000, 0.6000000000, 0.6000000000]) {
				translate(v = [0, 0, 2176.1000000000]) {
					linear_extrude(height = 100.0000000000) {
						polygon(paths = [[0, 1, 2, 3, 4, 5, 6, 7]], points = [[590, 1835], [590, 2415], [765, 2415], [765, 2005], [1470, 2005], [1470, 2415], [1695, 2415], [1695, 1835]]);
					}
				}
			}
			color(c = [0.9000000000, 0.6000000000, 0.6000000000]) {
				translate(v = [0, 0, 2176.1000000000]) {
					linear_extrude(height = 100.0000000000) {
						polygon(paths = [[0, 1, 2, 3, 4, 5, 6, 7, 8, 9, 10, 11]], points = [[1380, 295], [1380, 825], [1625, 825], [1625, 1665], [1875, 1665], [1875, 2445], [2210, 2445], [2210, 1495], [1795, 1495], [1795, 715], [1785, 715], [1785, 295]]);
					}
				}
			}
			color(c = [0.9000000000, 0.6000000000, 0.6000000000]) {
				translate(v = [0, 0, 2176.1000000000]) {
					linear_extrude(height = 100.0000000000) {
						polygon(paths = [[0, 1, 2, 3, 4, 5, 6, 7, 8, 9, 10, 11]], points = [[90, 1495], [90, 2635], [0, 2635], [0, 2805], [2300, 2805], [2300, 2635], [1265, 2635], [1265, 2175], [935, 2175], [935, 2635], [420, 2635], [420, 1495]]);
					}
				}
			}
			color(c = [0.5000000000, 0.5000000000, 0.5000000000]) {
				translate(v = [0, 0, 2276.1000000000]) {
					linear_extrude(height = 340.0000000000) {
						polygon(paths = [[0, 1, 2, 3]], points = [[145, -85], [145, 85], [315, 85], [315, -85]]);
					}
				}
			}
			color(c = [0.5000000000, 0.5000000000, 0.5000000000]) {
				translate(v = [0, 0, 2276.1000000000]) {
					linear_extrude(height = 340.0000000000) {
						polygon(paths = [[0, 1, 2, 3]], points = [[605, -85], [605, 85], [775, 85], [775, -85]]);
					}
				}
			}
			color(c = [0.5000000000, 0.5000000000, 0.5000000000]) {
				translate(v = [0, 0, 2276.1000000000]) {
					linear_extrude(height = 340.0000000000) {
						polygon(paths = [[0, 1, 2, 3]], points = [[1065, -85], [1065, 85], [1235, 85], [1235, -85]]);
					}
				}
			}
			color(c = [0.5000000000, 0.5000000000, 0.5000000000]) {
				translate(v = [0, 0, 2276.1000000000]) {
					linear_extrude(height = 340.0000000000) {
						polygon(paths = [[0, 1, 2, 3]], points = [[1525, -85], [1525, 85], [1695, 85], [1695, -85]]);
					}
				}
			}
			color(c = [0.5000000000, 0.5000000000, 0.5000000000]) {
				translate(v = [0, 0, 2276.1000000000]) {
					linear_extrude(height = 340.0000000000) {
						polygon(paths = [[0, 1, 2, 3]], points = [[1985, -85], [1985, 85], [2155, 85], [2155, -85]]);
					}
				}
			}
			color(c = [0.5000000000, 0.5000000000, 0.5000000000]) {
				translate(v = [0, 0, 2276.1000000000]) {
					linear_extrude(height = 340.0000000000) {
						polygon(paths = [[0, 1, 2, 3]], points = [[145, 2635], [145, 2805], [315, 2805], [315, 2635]]);
					}
				}
			}
			color(c = [0.5000000000, 0.5000000000, 0.5000000000]) {
				translate(v = [0, 0, 2276.1000000000]) {
					linear_extrude(height = 340.0000000000) {
						polygon(paths = [[0, 1, 2, 3]], points = [[605, 2635], [605, 2805], [775, 2805], [775, 2635]]);
					}
				}
			}
			color(c = [0.5000000000, 0.5000000000, 0.5000000000]) {
				translate(v = [0, 0, 2276.1000000000]) {
					linear_extrude(height = 340.0000000000) {
						polygon(paths = [[0, 1, 2, 3]], points = [[1065, 2635], [1065, 2805], [1235, 2805], [1235, 2635]]);
					}
				}
			}
			color(c = [0.5000000000, 0.5000000000, 0.5000000000]) {
				translate(v = [0, 0, 2276.1000000000]) {
					linear_extrude(height = 340.0000000000) {
						polygon(paths = [[0, 1, 2, 3]], points = [[1525, 2635], [1525, 2805], [1695, 2805], [1695, 2635]]);
					}
				}
			}
			color(c = [0.5000000000, 0.5000000000, 0.5000000000]) {
				translate(v = [0, 0, 2276.1000000000]) {
					linear_extrude(height = 340.0000000000) {
						polygon(paths = [[0, 1, 2, 3]], points = [[1985, 2635], [1985, 2805], [2155, 2805], [2155, 2635]]);
					}
				}
			}
			color(c = [0.3000000000, 0.3000000000, 1]) {
				translate(v = [0, 0, 2616.1000000000]) {
					linear_extrude(height = 360.0000000000) {
						polygon(paths = [[0, 1, 2, 3]], points = [[0, -240], [0, 240], [2300, 240], [2300, -240]]);
					}
				}
			}
			color(c = [0.3000000000, 0.3000000000, 1]) {
				translate(v = [0, 0, 2616.1000000000]) {
					linear_extrude(height = 360.0000000000) {
						polygon(paths = [[0, 1, 2, 3]], points = [[0, 2480], [0, 2960], [2300, 2960], [2300, 2480]]);
					}
				}
			}
		}
	}
}
